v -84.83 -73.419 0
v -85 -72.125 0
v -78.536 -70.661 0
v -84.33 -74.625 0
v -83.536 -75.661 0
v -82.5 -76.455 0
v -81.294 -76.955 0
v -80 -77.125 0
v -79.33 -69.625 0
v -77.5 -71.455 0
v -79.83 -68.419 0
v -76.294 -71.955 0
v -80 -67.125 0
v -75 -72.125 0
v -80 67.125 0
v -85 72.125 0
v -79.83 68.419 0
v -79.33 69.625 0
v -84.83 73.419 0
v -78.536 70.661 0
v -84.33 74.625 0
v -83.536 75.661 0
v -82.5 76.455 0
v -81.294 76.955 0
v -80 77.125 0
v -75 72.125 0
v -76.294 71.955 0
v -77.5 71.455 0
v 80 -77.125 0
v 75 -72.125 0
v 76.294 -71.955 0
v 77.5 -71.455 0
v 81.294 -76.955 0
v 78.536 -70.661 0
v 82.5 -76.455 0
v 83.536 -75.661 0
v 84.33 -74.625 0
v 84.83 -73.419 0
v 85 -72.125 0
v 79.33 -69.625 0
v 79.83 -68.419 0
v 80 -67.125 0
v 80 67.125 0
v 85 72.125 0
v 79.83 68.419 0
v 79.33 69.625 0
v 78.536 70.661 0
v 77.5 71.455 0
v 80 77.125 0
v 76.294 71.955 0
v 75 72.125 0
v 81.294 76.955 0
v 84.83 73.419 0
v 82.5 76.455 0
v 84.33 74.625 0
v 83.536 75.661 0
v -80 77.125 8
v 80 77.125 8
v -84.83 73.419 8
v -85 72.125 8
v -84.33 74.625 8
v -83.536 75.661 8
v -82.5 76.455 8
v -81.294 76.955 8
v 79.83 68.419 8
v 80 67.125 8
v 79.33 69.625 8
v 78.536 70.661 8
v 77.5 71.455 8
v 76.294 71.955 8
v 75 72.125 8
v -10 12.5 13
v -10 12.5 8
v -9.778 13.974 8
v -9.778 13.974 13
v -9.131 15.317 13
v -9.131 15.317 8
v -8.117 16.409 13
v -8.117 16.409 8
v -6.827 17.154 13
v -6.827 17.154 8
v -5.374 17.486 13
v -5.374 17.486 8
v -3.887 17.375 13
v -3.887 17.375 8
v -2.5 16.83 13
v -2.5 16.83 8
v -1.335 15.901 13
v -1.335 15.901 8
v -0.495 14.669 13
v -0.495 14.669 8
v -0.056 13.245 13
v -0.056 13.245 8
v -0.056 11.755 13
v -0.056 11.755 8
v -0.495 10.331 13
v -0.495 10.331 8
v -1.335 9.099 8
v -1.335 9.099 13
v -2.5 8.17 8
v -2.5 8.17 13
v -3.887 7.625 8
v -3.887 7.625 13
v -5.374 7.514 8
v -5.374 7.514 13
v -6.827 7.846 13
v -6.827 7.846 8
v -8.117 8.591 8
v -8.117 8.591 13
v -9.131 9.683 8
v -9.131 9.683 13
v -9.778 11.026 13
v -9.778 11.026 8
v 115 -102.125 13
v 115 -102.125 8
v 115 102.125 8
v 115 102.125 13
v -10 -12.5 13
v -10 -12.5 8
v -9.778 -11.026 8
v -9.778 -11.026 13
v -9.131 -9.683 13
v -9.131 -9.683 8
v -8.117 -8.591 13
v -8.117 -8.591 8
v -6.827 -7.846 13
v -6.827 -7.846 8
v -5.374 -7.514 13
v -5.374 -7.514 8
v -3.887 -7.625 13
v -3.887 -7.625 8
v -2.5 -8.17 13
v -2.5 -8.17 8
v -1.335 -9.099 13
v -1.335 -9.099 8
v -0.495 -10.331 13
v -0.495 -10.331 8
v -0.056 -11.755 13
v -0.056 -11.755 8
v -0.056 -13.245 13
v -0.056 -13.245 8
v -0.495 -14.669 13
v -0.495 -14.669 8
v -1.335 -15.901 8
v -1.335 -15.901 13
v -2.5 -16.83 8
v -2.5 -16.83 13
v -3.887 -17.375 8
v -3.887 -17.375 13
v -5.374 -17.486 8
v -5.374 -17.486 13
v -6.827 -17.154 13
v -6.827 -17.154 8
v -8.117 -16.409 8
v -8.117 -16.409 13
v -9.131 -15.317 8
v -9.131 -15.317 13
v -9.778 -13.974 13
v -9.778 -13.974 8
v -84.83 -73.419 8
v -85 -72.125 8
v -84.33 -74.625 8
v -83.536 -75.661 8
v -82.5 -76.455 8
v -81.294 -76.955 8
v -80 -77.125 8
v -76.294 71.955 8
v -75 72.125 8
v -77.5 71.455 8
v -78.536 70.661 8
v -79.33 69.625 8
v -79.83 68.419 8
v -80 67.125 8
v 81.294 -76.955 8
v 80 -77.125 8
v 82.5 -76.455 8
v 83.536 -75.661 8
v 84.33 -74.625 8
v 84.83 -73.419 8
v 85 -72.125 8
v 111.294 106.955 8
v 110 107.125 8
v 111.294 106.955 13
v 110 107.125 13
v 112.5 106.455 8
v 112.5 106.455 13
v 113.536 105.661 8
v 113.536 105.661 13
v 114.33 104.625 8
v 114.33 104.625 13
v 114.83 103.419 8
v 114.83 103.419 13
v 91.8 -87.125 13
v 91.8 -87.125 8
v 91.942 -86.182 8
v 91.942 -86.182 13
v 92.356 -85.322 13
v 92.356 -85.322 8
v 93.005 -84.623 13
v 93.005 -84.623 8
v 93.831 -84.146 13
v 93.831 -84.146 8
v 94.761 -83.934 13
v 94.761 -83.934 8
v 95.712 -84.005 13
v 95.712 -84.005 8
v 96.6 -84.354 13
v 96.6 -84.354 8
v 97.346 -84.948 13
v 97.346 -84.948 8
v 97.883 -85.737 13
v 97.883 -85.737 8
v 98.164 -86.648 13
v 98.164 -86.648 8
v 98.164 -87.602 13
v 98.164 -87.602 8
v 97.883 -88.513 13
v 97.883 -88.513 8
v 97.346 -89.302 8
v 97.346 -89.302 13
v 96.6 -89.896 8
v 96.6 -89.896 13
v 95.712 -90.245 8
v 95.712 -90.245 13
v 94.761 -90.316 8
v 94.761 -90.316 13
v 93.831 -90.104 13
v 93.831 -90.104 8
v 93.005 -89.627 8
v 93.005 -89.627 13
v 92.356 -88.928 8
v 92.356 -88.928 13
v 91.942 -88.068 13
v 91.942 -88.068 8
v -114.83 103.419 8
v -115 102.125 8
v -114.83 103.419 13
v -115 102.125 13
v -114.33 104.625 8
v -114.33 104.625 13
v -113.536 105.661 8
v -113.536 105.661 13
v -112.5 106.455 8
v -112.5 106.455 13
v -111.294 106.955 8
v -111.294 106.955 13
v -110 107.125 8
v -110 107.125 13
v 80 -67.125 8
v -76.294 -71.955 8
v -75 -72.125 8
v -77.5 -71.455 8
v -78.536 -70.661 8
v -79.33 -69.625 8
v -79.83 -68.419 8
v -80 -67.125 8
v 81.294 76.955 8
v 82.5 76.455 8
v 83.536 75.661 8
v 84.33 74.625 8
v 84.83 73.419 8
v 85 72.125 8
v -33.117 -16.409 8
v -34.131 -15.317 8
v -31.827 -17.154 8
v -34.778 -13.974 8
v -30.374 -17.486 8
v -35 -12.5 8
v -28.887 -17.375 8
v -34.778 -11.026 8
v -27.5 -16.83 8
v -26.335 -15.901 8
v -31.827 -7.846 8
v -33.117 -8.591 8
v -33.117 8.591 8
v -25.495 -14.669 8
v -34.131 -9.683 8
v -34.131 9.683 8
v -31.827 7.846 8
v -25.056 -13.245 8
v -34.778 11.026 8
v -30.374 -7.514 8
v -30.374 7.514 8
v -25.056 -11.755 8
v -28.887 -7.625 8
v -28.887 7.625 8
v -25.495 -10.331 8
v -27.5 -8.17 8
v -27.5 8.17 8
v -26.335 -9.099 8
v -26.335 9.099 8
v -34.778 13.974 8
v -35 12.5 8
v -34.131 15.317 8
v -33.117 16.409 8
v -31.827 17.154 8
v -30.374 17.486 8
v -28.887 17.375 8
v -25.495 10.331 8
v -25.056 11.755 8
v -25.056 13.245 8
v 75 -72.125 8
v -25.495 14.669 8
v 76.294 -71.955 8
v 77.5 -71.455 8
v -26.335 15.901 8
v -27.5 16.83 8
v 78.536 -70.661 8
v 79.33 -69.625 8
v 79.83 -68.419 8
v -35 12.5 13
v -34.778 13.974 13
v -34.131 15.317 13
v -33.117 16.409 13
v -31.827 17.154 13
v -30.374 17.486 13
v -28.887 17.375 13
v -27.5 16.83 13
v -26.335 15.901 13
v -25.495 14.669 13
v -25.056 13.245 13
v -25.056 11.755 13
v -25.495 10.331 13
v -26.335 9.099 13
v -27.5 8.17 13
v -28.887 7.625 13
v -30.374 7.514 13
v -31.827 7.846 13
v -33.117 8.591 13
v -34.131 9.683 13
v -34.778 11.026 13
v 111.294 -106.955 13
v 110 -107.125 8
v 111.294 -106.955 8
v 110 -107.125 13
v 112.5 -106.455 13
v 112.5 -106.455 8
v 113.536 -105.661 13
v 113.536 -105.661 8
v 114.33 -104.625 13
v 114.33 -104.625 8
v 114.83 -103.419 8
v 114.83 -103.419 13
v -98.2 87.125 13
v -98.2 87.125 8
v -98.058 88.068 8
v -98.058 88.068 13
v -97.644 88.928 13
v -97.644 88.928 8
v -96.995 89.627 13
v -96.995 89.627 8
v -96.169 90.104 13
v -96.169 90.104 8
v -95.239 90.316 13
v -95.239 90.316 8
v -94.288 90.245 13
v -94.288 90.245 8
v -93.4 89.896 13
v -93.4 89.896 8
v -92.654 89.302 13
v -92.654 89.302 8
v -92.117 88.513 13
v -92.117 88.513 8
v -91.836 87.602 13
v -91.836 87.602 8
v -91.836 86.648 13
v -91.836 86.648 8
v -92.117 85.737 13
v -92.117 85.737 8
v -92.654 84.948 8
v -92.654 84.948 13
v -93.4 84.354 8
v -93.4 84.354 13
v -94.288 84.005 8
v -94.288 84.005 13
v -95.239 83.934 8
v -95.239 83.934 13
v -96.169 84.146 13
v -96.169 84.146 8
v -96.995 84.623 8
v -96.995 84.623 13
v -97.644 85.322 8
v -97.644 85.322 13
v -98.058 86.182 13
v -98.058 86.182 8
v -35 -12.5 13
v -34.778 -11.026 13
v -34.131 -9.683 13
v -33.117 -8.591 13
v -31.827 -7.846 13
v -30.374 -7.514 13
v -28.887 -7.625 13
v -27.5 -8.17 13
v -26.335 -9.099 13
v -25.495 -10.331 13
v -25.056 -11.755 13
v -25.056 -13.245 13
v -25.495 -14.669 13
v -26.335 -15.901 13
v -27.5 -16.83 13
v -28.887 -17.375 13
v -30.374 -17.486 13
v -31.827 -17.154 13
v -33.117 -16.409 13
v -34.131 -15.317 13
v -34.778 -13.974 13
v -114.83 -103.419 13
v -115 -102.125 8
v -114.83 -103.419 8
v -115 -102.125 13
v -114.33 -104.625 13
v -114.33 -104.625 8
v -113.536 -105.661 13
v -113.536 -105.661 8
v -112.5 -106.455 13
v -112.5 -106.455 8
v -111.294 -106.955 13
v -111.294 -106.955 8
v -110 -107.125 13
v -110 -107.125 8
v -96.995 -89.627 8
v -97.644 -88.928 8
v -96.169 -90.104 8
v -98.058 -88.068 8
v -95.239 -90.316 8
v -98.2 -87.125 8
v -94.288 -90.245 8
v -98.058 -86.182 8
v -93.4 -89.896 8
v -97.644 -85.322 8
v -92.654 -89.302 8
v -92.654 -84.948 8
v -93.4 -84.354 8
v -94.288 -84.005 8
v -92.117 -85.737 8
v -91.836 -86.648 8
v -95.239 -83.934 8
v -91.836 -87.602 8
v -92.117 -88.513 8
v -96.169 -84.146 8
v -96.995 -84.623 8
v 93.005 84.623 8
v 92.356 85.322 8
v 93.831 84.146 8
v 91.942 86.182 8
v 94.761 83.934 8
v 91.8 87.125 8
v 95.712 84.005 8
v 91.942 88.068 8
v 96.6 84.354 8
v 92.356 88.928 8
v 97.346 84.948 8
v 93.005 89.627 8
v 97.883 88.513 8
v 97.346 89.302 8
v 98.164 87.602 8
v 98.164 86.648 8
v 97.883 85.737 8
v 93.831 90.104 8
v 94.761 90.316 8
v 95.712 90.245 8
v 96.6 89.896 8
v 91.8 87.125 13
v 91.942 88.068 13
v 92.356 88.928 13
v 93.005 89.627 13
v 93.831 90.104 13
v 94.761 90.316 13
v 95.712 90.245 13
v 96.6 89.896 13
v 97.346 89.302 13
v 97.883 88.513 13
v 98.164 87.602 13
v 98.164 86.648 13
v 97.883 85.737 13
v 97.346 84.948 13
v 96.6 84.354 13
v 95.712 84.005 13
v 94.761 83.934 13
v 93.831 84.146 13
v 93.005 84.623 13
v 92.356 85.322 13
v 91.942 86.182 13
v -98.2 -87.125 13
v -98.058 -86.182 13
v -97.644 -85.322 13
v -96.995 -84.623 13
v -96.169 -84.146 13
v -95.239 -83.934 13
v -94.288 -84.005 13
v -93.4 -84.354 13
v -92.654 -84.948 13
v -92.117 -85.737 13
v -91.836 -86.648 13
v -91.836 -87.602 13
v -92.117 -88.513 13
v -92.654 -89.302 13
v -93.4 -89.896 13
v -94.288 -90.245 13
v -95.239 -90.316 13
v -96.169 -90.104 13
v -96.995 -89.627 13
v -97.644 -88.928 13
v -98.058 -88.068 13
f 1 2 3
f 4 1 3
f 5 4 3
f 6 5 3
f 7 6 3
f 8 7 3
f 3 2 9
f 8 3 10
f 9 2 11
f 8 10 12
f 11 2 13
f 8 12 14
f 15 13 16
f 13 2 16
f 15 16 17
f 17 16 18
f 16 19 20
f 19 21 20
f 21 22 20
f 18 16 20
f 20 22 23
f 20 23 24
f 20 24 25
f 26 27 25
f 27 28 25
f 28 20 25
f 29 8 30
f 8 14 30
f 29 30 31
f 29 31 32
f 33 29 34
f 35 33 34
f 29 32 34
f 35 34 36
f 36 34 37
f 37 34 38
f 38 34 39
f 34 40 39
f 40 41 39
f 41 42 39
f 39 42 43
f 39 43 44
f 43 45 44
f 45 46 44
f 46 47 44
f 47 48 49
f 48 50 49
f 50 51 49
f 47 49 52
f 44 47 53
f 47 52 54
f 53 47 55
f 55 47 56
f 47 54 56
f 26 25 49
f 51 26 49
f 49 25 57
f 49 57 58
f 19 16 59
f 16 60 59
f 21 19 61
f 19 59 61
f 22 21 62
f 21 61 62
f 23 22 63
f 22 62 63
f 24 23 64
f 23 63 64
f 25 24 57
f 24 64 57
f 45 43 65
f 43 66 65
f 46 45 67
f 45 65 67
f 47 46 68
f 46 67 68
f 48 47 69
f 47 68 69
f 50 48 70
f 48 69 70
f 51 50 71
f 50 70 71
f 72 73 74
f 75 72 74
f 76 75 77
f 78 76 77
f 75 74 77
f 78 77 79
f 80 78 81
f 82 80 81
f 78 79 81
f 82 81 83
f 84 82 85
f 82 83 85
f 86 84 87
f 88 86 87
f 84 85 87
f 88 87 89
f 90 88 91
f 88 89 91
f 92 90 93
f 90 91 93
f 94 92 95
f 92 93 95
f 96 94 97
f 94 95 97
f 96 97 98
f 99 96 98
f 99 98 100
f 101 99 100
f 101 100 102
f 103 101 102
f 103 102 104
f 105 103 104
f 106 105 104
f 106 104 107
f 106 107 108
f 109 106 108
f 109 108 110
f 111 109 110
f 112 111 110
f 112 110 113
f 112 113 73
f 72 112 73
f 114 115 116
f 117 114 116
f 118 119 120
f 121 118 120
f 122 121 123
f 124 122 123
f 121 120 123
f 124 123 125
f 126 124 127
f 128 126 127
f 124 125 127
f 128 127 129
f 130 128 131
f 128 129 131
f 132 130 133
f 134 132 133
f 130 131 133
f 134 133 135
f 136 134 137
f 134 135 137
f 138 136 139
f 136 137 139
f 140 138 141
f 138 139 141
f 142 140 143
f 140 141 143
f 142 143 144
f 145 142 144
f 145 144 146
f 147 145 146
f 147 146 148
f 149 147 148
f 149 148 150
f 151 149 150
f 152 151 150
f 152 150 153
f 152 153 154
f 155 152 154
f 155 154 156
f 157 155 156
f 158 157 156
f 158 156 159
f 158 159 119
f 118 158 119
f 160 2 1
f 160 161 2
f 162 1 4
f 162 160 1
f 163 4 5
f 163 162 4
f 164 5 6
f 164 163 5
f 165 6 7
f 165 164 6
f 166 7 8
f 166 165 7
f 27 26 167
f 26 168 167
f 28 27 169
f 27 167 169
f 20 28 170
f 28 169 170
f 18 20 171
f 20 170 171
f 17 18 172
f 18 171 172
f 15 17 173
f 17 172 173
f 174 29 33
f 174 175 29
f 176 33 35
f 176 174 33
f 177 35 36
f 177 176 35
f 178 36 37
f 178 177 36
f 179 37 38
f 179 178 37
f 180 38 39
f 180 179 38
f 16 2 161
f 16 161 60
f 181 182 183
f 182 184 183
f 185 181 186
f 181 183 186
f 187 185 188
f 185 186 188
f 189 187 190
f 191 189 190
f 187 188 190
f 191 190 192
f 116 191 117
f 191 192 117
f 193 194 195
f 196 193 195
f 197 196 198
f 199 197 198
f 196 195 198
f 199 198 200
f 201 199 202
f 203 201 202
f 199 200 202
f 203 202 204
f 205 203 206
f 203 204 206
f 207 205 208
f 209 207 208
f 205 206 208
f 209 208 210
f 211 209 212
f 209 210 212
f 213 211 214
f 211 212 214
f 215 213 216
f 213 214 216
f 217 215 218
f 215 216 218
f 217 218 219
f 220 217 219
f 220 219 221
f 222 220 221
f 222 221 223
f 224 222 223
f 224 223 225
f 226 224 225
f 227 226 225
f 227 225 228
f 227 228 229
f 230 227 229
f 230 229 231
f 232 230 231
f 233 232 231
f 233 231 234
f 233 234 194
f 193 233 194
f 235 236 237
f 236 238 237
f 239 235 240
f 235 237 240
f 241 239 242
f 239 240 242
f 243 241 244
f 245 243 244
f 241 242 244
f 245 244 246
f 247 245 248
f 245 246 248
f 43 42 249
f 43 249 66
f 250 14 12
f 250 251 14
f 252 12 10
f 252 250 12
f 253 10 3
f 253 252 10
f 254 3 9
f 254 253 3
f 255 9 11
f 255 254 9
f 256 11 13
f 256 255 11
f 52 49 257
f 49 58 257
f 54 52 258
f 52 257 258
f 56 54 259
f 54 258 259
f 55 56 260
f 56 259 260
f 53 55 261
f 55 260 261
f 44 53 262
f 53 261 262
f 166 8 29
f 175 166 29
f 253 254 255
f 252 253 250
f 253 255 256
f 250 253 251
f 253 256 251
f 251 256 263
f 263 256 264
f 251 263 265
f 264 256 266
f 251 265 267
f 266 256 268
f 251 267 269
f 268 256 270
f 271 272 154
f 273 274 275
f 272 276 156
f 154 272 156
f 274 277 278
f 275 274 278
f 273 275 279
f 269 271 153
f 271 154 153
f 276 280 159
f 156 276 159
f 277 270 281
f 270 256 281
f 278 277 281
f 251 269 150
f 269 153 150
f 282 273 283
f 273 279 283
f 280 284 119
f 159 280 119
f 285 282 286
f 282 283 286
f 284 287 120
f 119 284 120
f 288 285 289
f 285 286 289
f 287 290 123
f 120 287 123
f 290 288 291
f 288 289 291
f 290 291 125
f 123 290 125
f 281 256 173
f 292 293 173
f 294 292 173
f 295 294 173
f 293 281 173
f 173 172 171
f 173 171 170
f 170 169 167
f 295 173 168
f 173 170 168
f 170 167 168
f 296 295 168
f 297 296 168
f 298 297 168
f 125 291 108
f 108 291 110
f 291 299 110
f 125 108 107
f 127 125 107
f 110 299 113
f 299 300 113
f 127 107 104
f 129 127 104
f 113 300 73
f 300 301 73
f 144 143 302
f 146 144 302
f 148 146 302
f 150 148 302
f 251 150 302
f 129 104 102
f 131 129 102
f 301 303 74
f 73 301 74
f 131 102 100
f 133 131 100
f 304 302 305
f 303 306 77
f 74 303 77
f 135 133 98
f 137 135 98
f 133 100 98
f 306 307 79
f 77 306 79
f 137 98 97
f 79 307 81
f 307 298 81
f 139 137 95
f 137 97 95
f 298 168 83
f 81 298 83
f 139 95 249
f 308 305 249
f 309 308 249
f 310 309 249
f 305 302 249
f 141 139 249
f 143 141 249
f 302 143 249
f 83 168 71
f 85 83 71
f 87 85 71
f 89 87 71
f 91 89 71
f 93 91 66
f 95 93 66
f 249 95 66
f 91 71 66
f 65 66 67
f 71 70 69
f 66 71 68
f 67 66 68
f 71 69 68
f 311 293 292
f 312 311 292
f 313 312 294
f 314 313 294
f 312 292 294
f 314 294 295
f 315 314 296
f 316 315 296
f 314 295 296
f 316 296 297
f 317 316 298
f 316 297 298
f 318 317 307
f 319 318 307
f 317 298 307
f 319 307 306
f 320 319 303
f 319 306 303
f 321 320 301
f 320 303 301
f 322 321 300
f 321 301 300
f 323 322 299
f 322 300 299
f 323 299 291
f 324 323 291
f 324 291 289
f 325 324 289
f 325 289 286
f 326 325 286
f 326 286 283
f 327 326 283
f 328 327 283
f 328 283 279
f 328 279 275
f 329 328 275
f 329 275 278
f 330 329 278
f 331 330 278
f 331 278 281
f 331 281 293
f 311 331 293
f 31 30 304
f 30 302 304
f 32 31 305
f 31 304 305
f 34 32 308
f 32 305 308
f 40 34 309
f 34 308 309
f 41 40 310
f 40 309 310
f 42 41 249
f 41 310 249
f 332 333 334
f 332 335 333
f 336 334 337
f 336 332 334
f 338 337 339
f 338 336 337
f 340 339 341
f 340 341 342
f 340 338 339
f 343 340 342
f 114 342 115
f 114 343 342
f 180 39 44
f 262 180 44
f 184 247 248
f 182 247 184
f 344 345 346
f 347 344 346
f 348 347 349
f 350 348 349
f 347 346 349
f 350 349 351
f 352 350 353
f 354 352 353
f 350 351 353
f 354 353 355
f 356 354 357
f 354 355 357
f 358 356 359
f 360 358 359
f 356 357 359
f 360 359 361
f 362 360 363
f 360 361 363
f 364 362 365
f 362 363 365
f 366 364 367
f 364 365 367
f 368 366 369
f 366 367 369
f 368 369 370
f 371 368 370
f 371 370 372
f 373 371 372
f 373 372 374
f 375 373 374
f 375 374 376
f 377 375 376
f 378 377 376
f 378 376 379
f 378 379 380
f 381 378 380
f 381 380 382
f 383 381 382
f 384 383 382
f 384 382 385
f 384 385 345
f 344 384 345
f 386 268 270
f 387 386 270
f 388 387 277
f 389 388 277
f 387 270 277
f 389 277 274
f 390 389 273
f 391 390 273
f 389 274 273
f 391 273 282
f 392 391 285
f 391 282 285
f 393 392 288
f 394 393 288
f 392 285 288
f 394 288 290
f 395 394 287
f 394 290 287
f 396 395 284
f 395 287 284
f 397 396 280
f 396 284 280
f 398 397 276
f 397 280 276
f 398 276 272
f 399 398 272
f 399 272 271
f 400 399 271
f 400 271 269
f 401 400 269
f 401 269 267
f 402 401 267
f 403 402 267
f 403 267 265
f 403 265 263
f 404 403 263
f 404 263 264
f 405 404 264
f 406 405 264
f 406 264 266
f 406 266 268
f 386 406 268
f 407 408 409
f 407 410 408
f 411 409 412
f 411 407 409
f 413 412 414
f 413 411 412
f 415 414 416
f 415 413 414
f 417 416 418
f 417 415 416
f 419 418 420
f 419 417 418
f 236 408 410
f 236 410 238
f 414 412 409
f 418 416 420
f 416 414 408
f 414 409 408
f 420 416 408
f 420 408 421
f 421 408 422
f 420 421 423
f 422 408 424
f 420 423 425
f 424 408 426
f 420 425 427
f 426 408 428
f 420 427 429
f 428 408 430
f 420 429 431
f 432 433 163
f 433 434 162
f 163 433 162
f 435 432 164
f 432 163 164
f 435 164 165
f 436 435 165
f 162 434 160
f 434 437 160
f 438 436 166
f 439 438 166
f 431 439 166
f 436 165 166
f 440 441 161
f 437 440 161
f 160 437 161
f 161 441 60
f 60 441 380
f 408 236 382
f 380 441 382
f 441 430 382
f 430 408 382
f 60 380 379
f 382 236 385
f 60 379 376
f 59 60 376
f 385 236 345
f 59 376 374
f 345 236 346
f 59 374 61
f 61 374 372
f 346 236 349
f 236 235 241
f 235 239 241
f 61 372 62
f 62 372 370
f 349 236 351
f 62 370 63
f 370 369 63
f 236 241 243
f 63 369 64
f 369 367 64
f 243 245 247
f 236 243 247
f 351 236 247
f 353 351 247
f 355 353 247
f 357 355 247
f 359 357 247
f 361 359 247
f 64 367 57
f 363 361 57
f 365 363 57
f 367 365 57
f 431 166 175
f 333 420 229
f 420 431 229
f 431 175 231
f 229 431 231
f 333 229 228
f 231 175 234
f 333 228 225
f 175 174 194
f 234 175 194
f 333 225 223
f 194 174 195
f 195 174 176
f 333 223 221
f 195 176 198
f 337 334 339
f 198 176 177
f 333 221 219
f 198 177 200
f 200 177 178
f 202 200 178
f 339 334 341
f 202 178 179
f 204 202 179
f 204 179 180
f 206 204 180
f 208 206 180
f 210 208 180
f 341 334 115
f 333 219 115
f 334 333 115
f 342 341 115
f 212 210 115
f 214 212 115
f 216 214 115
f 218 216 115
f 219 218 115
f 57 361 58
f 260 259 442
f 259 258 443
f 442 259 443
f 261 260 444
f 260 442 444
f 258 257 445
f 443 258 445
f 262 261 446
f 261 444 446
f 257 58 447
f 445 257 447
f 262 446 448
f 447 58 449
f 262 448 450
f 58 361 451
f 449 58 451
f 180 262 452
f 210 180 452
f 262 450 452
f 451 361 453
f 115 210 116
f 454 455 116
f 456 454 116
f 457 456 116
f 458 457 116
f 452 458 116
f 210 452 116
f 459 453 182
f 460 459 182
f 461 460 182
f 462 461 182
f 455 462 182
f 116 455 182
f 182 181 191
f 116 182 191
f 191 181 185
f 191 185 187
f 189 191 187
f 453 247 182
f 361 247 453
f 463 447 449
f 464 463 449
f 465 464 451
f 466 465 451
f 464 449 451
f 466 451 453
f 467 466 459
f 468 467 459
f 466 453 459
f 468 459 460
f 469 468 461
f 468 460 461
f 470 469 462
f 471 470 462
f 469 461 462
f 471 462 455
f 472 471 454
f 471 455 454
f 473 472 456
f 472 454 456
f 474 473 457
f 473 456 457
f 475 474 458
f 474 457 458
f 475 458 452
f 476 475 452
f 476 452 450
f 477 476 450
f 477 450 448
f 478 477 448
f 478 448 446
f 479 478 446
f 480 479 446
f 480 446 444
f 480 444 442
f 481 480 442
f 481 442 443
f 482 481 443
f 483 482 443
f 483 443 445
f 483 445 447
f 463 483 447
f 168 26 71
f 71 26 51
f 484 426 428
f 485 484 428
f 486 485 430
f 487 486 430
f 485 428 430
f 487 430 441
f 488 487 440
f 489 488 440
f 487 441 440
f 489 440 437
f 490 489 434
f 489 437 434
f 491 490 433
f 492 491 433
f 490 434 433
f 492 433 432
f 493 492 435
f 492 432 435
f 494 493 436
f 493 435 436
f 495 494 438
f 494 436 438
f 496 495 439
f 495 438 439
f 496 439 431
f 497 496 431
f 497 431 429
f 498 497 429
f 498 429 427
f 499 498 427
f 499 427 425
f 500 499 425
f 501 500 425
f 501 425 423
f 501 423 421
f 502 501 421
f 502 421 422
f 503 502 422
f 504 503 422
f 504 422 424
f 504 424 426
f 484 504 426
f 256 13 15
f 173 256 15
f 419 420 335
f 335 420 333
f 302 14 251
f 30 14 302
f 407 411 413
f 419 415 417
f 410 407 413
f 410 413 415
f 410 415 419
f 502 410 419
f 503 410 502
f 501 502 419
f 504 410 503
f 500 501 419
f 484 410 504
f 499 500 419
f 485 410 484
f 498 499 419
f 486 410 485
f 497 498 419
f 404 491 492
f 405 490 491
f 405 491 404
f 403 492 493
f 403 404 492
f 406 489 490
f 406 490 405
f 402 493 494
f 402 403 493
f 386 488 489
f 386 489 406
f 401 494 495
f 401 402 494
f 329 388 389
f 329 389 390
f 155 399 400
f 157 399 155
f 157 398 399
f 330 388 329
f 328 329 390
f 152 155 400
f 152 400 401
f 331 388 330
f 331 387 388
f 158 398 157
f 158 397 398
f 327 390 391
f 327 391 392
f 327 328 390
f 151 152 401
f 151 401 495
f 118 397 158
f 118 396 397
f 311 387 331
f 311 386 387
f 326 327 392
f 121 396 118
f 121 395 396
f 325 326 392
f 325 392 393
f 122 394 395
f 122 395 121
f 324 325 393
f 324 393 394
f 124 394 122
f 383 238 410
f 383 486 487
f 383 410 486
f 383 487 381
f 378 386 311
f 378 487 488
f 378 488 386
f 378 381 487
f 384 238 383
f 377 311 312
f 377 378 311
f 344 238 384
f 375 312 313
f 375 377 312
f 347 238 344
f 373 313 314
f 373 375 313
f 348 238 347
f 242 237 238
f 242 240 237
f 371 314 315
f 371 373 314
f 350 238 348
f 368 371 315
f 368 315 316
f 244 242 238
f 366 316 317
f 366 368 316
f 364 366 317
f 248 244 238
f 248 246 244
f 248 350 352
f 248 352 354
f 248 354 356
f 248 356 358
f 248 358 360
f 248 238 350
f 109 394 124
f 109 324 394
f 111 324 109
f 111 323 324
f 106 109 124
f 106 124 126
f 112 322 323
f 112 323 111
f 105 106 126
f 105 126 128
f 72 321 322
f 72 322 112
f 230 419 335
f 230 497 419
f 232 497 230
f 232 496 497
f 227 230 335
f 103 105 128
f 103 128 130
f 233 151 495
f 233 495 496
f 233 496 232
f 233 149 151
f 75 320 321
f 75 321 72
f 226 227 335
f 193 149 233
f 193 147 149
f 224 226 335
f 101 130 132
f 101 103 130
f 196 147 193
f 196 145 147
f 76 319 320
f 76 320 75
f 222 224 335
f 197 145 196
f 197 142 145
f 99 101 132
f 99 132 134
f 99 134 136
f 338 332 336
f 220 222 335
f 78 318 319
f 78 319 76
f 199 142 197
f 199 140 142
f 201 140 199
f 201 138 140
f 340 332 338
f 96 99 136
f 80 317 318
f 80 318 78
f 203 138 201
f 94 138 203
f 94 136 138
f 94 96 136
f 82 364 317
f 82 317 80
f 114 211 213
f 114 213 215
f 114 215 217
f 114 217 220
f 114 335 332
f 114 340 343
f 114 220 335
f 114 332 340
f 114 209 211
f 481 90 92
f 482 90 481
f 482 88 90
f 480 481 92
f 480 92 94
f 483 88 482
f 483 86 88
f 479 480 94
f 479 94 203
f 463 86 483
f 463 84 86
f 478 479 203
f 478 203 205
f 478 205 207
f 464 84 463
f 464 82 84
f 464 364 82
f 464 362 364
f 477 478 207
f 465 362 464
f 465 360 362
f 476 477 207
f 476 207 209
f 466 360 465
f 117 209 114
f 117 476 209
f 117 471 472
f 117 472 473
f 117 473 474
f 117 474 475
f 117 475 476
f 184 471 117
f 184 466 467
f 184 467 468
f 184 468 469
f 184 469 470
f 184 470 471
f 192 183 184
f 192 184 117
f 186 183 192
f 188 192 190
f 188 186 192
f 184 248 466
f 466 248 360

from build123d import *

# Parameters (mm, degrees)
SKETCH_1_W                  = 170
SKETCH_1_H                  = 154.25
SKETCH_1_W_2                = 160
SKETCH_1_H_2                = 144.25
EXTRUDE_1_DEPTH             = 8
FILLET_1_R                  = 5
SKETCH_2_W                  = 230
SKETCH_2_H                  = 214.25
EXTRUDE_2_DEPTH             = 5
FILLET_2_R                  = 5
HOLE_WIZARD_6_4_6_4_1_D     = 6.4
HOLE_WIZARD_6_4_6_4_1_DEPTH = 5
HOLE_WIZARD_10_0_10_1_D     = 10


with BuildPart() as part:
    # 草图1 → 凸台-拉伸1 (new body)
    with BuildSketch(Plane.XY):
        Rectangle(SKETCH_1_W, SKETCH_1_H)
        Rectangle(SKETCH_1_W_2, SKETCH_1_H_2, mode=Mode.SUBTRACT)
    extrude(amount=EXTRUDE_1_DEPTH)

    # 圆角1
    fillet_1_edges = [part.edges().sort_by_distance(p)[0] for p in [
        (-80, 72.125, 4),
        (-80, -72.125, 4),
        (80, -72.125, 4),
        (80, 72.125, 4),
        (-85, 77.125, 4),
        (85, 77.125, 4),
        (85, -77.125, 4),
        (-85, -77.125, 4),
    ]]
    fillet(fillet_1_edges, radius=FILLET_1_R)

    # 草图2 → 凸台-拉伸2 (add)
    with BuildSketch(Plane.XY.offset(8)):
        Rectangle(SKETCH_2_W, SKETCH_2_H)
    extrude(amount=EXTRUDE_2_DEPTH)

    # 圆角2
    fillet_2_edges = [part.edges().sort_by_distance(p)[0] for p in [
        (-115, 107.125, 10.5),
        (-115, -107.125, 10.5),
        (115, -107.125, 10.5),
        (115, 107.125, 10.5),
    ]]
    fillet(fillet_2_edges, radius=FILLET_2_R)

    # Ø6.4 (6.4) 直径孔1
    with Locations(Plane.XY.offset(13)):
        with Locations((-95, 87.125), (95, 87.125), (95, -87.125), (-95, -87.125)):
            Hole(HOLE_WIZARD_6_4_6_4_1_D / 2, depth=HOLE_WIZARD_6_4_6_4_1_DEPTH)

    # Ø10.0 (10) 直径孔1 (through all)
    with Locations(Plane.XY.offset(13)):
        with Locations((-30, 12.5), (-5, 12.5), (-5, -12.5), (-30, -12.5)):
            Hole(HOLE_WIZARD_10_0_10_1_D / 2)


solid = part.part
